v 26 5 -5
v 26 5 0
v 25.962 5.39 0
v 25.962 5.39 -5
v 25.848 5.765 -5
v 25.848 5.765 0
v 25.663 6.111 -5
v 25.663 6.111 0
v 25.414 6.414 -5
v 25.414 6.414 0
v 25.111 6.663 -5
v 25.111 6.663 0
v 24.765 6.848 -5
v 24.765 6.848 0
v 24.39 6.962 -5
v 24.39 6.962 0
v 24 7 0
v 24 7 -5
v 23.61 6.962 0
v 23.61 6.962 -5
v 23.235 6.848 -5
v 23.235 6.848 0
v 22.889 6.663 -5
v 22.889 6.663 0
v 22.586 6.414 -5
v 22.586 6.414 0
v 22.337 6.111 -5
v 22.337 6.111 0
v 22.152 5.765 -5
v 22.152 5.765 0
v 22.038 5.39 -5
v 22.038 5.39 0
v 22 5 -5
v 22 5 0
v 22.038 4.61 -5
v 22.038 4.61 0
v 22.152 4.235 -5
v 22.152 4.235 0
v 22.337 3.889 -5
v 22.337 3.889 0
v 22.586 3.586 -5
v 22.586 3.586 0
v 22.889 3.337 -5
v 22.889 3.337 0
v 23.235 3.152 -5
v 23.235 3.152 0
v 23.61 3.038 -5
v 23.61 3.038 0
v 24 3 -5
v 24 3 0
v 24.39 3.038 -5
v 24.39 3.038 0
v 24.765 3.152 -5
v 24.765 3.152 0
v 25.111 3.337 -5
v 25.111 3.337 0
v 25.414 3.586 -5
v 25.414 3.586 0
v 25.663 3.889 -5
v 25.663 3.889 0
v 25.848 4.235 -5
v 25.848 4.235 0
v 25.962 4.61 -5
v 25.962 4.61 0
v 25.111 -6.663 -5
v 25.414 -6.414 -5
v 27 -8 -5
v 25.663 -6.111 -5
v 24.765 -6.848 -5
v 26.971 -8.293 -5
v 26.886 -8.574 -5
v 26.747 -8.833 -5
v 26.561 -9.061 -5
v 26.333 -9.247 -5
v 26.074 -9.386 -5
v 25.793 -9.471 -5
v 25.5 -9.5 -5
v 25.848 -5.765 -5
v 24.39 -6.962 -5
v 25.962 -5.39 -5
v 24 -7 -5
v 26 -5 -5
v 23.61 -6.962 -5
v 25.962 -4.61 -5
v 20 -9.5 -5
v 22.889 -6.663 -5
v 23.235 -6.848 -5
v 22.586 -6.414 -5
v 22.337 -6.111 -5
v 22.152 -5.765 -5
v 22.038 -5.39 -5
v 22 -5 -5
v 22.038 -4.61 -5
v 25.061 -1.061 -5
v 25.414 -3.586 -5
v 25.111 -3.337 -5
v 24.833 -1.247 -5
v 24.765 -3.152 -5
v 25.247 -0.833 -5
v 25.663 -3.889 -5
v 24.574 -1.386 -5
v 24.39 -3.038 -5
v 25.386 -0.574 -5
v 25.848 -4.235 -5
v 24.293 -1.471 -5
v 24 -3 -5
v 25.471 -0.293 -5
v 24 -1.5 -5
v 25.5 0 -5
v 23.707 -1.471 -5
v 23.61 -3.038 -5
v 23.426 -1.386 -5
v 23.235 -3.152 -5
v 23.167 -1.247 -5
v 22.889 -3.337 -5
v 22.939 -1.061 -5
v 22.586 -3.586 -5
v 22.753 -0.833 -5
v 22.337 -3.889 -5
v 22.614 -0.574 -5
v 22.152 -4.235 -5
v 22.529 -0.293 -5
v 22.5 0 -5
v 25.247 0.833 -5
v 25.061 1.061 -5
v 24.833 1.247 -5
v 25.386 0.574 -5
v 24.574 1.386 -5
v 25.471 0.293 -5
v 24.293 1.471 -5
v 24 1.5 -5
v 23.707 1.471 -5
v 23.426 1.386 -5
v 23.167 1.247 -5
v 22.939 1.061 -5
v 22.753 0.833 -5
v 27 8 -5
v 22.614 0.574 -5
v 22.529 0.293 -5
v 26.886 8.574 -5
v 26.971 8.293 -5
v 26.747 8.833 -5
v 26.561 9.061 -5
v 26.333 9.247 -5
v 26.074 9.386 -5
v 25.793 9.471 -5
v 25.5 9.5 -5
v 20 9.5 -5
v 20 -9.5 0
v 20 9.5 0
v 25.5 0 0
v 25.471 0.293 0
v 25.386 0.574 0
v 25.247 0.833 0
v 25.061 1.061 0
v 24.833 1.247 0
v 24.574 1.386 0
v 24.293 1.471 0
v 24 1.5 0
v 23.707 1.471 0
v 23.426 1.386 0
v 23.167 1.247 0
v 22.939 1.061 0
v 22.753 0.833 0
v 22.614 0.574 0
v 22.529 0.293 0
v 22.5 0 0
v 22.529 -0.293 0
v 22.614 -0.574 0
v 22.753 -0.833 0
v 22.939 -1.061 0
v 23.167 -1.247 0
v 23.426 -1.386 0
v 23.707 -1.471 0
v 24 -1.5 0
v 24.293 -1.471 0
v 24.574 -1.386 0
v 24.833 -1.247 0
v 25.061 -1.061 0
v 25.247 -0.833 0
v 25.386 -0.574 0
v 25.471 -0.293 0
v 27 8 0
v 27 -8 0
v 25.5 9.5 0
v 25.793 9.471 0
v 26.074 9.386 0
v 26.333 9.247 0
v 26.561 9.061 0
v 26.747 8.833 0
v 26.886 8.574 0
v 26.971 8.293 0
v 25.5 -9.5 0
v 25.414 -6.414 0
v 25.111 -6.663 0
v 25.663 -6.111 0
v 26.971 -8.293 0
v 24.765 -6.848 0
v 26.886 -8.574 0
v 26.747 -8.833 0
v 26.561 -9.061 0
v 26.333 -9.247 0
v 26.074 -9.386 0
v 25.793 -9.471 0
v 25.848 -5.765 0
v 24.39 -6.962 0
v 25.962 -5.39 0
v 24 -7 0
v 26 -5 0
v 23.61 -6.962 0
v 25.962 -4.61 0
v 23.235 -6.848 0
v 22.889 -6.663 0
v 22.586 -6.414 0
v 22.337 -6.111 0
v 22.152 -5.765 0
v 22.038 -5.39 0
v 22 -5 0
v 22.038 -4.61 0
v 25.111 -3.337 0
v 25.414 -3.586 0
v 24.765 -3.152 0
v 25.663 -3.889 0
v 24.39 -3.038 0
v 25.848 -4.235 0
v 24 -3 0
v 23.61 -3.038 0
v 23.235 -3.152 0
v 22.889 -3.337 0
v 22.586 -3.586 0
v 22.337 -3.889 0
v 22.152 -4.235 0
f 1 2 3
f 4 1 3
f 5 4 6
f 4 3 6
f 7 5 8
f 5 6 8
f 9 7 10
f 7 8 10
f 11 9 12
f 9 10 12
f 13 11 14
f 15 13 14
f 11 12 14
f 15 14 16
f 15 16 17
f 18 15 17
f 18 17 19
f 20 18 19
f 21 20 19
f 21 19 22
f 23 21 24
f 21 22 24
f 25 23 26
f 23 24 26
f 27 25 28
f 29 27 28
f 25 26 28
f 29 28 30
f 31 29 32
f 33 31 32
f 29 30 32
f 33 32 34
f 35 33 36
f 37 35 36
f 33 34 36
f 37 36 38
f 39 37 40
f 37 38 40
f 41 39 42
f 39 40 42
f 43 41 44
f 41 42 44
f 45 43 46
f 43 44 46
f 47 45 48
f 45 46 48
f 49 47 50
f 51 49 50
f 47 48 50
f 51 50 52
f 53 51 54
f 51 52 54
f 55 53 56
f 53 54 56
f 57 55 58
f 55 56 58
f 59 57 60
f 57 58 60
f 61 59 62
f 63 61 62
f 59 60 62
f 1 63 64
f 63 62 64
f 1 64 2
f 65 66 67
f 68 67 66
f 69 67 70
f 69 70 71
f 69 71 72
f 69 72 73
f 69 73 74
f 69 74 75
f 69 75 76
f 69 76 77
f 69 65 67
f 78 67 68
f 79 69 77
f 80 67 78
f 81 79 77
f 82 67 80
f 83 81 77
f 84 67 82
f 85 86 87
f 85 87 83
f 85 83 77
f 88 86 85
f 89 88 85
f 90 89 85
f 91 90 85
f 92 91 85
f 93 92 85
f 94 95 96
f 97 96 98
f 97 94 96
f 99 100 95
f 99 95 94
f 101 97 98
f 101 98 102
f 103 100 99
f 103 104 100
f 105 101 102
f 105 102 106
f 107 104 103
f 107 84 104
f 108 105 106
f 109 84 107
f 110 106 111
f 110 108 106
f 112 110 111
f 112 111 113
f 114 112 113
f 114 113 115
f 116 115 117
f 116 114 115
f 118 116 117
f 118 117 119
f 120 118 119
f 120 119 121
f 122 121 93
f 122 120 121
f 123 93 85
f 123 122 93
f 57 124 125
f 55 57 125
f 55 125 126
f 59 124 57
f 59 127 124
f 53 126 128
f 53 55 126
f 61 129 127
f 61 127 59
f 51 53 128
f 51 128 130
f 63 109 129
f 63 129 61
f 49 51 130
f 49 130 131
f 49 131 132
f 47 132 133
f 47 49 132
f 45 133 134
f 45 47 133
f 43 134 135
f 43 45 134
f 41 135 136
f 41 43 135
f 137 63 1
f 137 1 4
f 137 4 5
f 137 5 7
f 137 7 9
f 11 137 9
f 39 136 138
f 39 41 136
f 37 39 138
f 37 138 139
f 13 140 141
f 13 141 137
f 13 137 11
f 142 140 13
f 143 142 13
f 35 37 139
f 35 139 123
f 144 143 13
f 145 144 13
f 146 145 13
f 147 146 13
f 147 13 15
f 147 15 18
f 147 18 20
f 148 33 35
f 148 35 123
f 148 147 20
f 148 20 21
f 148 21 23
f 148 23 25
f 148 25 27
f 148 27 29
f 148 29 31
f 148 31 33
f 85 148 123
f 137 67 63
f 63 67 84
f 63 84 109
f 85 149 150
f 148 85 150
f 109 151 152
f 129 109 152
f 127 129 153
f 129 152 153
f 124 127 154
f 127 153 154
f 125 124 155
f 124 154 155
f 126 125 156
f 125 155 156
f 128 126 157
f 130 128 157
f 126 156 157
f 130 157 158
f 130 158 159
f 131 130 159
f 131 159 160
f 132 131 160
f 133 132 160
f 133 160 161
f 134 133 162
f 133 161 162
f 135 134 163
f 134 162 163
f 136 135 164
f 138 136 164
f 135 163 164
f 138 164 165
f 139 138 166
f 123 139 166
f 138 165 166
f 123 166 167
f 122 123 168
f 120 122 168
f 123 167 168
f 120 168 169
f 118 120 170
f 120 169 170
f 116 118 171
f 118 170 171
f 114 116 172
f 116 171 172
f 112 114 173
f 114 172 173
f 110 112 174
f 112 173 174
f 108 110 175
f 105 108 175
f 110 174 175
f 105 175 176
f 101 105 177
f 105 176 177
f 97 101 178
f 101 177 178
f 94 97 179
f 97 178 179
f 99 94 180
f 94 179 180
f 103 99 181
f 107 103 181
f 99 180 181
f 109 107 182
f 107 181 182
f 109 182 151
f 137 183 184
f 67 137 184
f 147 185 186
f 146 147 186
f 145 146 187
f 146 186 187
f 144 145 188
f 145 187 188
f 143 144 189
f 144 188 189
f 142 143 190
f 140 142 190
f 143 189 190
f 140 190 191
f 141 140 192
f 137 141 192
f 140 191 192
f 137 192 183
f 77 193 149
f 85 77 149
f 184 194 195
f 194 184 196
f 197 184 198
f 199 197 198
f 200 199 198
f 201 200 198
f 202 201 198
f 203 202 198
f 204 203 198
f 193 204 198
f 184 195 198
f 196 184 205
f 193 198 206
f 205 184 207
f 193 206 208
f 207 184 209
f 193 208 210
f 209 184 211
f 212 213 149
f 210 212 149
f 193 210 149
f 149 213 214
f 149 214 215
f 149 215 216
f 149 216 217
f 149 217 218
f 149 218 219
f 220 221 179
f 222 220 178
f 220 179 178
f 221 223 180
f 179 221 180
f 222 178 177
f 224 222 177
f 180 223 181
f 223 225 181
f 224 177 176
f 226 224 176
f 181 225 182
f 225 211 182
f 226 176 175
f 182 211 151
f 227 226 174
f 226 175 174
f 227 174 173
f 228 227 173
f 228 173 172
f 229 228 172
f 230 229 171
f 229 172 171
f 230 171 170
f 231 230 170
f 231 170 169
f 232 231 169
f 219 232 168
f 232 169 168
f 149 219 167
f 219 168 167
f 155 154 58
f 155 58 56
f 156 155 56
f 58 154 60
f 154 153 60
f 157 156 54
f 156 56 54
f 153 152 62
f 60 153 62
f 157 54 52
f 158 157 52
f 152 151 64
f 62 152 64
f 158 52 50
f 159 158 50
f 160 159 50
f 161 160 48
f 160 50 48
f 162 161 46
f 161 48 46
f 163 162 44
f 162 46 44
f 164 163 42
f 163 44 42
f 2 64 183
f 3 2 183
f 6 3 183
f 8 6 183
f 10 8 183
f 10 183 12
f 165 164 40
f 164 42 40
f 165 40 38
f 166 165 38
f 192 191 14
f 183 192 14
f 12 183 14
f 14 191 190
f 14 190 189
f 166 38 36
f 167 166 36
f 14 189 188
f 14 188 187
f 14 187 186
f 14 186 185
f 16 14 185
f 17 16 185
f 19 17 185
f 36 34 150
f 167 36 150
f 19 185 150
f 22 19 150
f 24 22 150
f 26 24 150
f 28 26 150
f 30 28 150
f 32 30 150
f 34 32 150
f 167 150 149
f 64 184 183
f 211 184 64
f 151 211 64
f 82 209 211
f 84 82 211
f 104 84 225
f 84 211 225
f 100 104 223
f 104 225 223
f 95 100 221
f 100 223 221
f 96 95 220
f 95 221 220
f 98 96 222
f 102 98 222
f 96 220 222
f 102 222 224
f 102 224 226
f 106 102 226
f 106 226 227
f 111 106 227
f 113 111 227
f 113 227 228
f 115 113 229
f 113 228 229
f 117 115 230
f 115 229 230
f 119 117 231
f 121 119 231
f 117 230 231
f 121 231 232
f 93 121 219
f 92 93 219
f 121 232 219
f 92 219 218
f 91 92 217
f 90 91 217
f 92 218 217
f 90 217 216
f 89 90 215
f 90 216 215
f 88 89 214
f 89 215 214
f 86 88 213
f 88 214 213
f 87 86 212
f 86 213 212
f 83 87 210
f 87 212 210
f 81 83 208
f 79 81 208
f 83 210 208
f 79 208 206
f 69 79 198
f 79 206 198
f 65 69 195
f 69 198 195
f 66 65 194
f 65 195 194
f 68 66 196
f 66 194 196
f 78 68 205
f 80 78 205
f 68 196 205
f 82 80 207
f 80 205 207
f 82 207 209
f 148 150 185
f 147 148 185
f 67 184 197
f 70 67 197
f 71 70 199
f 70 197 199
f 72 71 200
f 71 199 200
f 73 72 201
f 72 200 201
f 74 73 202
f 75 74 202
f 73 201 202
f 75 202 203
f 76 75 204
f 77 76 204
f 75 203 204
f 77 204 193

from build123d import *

# Parameters (mm, degrees)
SKETCH1_R           = 2
SKETCH1_R_2         = 1.5
BOSS_EXTRUDE2_DEPTH = 5


with BuildPart() as part:
    # Sketch1 → Boss-Extrude2 (new body)
    with BuildSketch(Plane.XY):
        with BuildLine():
            Line((20, -9.5), (20, 9.5))
            Line((20, 9.5), (25.5, 9.5))
            ThreePointArc((25.5, 9.5), (26.560660172, 9.060660172), (27, 8))
            Line((27, 8), (27, -8))
            ThreePointArc((27, -8), (26.560660172, -9.060660172), (25.5, -9.5))
            Line((25.5, -9.5), (20, -9.5))
        make_face()
        with Locations((24, 5)):
            Circle(SKETCH1_R, mode=Mode.SUBTRACT)
        with Locations((24, -5)):
            Circle(SKETCH1_R, mode=Mode.SUBTRACT)
        with Locations((24, 0)):
            Circle(SKETCH1_R_2, mode=Mode.SUBTRACT)
    extrude(amount=-BOSS_EXTRUDE2_DEPTH)


solid = part.part
